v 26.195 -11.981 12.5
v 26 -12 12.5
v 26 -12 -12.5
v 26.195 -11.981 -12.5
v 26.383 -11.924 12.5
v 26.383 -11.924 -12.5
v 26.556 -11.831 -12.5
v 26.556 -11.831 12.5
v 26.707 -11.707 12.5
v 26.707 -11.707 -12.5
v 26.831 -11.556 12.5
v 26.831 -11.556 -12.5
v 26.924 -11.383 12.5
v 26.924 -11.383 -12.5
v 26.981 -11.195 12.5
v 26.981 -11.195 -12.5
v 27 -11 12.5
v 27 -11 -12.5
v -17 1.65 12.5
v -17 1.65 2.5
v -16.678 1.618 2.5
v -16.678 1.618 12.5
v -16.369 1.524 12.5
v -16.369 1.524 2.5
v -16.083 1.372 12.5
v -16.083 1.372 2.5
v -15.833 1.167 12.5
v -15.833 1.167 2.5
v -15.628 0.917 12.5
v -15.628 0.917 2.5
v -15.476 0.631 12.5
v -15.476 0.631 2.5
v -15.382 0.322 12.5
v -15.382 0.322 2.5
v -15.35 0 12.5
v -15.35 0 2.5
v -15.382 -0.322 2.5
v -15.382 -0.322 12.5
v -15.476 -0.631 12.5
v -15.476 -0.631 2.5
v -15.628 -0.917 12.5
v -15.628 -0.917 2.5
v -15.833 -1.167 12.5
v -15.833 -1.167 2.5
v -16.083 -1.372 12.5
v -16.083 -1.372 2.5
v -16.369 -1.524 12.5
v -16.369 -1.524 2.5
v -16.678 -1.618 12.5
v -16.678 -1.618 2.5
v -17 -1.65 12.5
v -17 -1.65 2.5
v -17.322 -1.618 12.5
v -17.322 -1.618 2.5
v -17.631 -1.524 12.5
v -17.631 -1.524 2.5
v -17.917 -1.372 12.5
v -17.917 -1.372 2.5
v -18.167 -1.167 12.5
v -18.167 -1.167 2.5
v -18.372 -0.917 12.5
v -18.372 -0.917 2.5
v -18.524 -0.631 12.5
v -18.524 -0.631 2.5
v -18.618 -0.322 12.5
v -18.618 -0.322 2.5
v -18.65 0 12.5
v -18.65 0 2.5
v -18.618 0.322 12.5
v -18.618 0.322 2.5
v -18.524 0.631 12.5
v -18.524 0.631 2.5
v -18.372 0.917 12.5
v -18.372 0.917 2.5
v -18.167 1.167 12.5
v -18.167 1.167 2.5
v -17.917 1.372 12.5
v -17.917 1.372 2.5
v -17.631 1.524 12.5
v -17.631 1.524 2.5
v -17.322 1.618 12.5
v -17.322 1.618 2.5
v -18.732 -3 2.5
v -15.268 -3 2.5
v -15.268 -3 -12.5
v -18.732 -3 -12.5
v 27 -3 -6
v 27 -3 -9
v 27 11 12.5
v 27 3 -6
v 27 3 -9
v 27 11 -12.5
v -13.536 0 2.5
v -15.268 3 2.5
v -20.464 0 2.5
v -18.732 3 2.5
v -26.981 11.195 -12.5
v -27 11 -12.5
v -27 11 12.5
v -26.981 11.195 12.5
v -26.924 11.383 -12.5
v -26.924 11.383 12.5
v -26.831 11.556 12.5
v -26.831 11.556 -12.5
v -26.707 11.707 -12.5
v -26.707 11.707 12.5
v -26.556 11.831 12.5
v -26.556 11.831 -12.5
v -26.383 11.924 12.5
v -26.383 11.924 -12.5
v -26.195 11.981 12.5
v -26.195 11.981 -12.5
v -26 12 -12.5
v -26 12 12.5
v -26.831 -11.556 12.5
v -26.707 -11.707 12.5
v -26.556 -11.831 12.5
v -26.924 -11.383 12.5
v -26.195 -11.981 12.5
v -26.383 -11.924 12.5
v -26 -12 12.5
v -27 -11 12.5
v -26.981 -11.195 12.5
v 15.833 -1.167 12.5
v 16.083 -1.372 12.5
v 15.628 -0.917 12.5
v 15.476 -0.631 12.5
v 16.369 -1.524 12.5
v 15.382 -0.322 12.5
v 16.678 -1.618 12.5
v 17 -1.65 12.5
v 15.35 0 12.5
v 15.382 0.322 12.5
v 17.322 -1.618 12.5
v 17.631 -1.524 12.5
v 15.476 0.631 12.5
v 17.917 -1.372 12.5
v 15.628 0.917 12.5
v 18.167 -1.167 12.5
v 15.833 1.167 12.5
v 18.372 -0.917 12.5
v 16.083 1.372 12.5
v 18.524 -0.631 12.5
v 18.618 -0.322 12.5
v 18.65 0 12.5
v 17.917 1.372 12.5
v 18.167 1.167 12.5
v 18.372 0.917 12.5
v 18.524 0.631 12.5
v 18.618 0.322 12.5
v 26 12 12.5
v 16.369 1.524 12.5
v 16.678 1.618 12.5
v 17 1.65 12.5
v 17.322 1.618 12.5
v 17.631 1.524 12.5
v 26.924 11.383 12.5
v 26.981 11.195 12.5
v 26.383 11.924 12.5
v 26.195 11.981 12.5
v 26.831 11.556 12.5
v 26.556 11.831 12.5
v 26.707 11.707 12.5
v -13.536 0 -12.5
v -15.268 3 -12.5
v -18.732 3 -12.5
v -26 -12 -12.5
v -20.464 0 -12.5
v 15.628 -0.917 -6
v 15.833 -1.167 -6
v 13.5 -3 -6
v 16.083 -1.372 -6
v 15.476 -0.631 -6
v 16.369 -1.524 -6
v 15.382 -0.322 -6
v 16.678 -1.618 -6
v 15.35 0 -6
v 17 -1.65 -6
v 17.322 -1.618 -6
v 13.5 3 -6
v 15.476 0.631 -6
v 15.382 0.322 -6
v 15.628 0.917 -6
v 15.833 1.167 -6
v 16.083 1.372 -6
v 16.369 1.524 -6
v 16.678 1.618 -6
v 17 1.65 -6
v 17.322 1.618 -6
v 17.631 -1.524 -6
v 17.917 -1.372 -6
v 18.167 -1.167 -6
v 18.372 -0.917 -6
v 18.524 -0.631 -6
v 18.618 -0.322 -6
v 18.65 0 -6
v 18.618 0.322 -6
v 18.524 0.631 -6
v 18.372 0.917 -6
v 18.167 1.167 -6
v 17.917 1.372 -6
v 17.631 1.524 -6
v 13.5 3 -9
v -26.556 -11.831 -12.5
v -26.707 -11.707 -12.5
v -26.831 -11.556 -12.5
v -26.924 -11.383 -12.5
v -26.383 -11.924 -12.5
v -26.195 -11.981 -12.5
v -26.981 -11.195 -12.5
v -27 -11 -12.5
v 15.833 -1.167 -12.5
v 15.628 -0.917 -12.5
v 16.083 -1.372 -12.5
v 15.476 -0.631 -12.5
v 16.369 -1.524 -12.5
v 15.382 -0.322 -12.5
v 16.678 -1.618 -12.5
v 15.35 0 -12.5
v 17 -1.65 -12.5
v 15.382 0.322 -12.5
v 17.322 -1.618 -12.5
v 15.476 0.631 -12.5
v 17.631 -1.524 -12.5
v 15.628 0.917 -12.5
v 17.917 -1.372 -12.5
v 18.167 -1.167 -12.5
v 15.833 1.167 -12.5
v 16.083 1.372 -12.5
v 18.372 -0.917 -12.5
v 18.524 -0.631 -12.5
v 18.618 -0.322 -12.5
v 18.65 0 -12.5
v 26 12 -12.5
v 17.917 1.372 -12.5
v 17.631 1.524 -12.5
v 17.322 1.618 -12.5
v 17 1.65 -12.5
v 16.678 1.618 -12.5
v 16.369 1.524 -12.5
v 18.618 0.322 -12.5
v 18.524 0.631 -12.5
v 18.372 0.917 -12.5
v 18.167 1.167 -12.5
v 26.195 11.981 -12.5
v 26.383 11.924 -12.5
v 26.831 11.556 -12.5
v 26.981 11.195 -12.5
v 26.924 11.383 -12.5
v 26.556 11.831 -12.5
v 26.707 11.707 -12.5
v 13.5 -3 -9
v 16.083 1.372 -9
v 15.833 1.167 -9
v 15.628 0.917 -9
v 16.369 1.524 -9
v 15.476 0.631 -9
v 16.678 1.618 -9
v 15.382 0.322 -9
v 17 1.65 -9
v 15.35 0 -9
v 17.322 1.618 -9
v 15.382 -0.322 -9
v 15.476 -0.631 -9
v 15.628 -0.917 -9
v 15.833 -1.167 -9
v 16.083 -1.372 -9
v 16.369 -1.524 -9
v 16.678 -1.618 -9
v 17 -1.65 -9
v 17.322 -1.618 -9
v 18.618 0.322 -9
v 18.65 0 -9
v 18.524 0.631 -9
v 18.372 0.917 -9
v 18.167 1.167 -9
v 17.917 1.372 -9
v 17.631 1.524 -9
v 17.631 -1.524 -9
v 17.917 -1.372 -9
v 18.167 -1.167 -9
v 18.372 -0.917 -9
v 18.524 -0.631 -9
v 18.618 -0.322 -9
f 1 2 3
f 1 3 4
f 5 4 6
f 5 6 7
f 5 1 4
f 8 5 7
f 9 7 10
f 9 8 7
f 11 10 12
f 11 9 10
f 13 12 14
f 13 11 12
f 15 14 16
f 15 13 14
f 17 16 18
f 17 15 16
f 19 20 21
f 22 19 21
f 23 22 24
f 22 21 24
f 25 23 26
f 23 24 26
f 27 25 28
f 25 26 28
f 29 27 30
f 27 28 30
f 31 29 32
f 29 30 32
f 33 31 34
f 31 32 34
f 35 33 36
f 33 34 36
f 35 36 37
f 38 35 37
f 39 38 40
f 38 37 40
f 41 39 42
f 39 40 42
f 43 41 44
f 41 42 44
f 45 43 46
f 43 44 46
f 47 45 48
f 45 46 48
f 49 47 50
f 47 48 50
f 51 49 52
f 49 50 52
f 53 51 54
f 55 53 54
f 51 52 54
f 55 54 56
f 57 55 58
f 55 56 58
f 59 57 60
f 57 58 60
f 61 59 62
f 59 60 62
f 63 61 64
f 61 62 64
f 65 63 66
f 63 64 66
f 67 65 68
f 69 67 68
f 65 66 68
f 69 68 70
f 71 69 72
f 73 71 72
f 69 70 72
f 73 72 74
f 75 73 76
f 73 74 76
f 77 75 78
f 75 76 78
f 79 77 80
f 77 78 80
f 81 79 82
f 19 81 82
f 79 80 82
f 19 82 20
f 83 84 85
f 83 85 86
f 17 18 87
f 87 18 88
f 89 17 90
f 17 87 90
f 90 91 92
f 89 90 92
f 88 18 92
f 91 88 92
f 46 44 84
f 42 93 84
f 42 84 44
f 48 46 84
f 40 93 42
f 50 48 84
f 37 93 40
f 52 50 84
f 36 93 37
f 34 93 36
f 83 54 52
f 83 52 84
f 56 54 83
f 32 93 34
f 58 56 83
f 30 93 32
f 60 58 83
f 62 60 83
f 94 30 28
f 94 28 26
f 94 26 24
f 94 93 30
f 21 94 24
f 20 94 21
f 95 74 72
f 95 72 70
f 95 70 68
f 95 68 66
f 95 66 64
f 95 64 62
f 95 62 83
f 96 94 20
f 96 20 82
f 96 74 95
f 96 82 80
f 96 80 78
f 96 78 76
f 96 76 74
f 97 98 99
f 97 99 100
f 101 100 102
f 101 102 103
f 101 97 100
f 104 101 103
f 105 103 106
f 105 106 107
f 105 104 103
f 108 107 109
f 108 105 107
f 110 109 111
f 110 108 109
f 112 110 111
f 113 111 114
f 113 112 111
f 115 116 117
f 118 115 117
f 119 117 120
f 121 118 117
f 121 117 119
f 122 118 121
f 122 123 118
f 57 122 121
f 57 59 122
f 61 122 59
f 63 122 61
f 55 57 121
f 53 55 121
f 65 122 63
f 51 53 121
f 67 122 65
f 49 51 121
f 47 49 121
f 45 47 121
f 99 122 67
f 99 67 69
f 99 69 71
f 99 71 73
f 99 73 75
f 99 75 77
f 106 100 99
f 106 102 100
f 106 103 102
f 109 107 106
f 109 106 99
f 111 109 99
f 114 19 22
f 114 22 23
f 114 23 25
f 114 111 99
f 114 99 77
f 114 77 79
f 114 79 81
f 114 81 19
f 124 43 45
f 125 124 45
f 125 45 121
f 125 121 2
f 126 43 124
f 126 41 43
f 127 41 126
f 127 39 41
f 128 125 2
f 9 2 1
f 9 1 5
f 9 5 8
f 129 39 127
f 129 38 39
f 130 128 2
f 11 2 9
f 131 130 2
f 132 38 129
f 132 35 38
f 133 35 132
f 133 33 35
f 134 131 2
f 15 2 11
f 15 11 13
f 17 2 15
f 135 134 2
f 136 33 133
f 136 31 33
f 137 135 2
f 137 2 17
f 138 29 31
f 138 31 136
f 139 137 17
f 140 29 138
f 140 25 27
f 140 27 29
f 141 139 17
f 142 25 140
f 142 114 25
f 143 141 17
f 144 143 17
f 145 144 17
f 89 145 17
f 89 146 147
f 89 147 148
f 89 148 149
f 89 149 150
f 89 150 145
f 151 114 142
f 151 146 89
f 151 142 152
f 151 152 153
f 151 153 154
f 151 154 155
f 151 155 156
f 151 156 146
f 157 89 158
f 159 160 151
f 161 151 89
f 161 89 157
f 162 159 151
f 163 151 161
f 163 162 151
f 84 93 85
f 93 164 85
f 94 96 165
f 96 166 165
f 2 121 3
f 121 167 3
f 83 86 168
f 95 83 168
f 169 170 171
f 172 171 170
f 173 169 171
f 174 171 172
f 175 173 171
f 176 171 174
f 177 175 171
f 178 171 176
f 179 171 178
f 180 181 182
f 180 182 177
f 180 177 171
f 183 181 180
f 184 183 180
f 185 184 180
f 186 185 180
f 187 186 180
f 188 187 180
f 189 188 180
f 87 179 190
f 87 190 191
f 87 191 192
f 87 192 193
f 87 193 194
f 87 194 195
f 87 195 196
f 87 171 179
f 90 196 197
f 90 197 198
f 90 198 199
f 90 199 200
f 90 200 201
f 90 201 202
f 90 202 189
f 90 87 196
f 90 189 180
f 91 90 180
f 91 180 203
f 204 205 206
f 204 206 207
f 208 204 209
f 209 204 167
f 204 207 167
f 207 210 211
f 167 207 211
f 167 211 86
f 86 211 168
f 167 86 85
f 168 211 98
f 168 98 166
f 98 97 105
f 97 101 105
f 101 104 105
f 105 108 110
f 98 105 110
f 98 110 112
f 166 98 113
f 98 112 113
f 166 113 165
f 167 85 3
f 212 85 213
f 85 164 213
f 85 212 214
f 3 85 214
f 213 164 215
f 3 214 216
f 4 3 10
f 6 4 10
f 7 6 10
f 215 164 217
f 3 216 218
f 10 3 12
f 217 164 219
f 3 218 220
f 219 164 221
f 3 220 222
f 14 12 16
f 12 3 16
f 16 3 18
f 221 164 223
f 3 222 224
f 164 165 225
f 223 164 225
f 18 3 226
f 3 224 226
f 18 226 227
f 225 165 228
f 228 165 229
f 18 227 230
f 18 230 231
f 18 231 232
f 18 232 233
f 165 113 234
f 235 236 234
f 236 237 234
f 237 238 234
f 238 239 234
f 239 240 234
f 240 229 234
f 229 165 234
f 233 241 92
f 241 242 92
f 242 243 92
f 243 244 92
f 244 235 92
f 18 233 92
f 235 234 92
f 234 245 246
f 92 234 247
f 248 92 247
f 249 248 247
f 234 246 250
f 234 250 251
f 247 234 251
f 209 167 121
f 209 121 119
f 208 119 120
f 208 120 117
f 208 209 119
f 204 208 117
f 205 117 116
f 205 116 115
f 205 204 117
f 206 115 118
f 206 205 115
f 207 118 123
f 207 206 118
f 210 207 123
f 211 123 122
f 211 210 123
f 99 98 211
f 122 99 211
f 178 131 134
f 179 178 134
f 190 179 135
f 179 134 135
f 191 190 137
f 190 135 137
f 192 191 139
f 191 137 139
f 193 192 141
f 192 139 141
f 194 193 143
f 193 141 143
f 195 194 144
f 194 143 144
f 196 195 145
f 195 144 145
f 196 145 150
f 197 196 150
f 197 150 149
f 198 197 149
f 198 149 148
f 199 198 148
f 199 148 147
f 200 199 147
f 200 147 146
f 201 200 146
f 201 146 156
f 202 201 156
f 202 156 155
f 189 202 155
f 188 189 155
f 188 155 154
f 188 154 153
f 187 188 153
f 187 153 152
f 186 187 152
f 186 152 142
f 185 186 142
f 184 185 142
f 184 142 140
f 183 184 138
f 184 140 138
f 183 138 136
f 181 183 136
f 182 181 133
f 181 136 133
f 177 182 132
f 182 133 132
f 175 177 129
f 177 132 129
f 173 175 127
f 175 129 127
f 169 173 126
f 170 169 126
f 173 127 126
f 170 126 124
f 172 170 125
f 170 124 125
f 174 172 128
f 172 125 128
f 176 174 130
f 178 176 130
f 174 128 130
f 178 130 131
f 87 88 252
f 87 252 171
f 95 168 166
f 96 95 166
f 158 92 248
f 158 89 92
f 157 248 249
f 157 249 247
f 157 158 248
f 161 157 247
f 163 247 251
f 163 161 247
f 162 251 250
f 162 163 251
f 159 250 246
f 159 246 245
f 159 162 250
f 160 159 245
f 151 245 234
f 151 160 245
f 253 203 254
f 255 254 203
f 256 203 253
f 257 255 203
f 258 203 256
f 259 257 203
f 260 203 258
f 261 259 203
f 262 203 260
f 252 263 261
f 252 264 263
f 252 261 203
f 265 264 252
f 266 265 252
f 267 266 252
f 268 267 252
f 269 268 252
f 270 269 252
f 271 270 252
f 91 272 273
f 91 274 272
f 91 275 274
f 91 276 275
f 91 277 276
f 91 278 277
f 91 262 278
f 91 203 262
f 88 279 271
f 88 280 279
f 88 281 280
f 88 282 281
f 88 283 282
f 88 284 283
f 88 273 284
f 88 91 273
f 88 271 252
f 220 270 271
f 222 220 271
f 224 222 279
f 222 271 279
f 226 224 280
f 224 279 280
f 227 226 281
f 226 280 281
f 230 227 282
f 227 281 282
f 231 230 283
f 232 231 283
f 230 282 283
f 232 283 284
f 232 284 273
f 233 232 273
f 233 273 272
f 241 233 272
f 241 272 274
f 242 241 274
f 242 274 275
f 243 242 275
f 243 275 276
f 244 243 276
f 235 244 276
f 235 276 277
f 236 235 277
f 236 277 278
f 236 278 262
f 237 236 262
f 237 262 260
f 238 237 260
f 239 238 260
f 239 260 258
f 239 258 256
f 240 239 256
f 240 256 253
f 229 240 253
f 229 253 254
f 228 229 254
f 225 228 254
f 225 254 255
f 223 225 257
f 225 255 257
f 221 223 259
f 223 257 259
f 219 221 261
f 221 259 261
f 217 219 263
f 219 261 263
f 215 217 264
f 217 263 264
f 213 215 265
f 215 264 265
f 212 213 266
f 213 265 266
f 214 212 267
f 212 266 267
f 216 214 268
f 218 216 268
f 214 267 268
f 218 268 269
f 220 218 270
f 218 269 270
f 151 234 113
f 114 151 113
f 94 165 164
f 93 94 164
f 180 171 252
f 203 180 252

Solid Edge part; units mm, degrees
sketch "Sketch1" plane through (0, 0, 0) normal (0, 0, 1) x (1, 0, 0)
  line L0 (-27, -12) -> (27, -12)
  line L1 (27, -12) -> (27, 12)
  line L2 (27, 12) -> (-27, 12)
  line L3 (-27, 12) -> (-27, -12)
  dimension "D1" = 54
  dimension "D2" = 24
extrude "Ajout_matière_1" add sketch "Sketch1" along normal mid plane 25
fillet "Congé_1" radius 1 4 edges at (27, -12, 0) (27, 12, 0) (-27, -12, 0) (-27, 12, 0)
hole "Hole1" at (17, 0, 12.5) direction (0, 0, -1) diameter 3.3 end up to next
sketch "Sketch2" plane through (27, 0, 0) normal (1, 0, 0) x (0, 0, -1)
  line L0 (6, 3) -> (9, 3)
  line L1 (9, 3) -> (9, -3)
  line L2 (9, -3) -> (6, -3)
  line L3 (6, -3) -> (6, 3)
  dimension "D1" = 6
  dimension "D2" = 3
  dimension "D3" = 5
extrude "Enlèvement_matière_3" cut sketch "Sketch2" against normal blind 13.5
sketch "Sketch3" plane through (0, 0, -12.5) normal (0, 0, -1) x (0, 1, 0)
  line L0 (3, -15.2679) -> (0, -13.5359)
  line L1 (0, -13.5359) -> (-3, -15.2679)
  line L2 (-3, -15.2679) -> (-3, -18.7321)
  line L3 (-3, -18.7321) -> (0, -20.4641)
  line L4 (0, -20.4641) -> (3, -18.7321)
  line L5 (3, -18.7321) -> (3, -15.2679)
  dimension "D1" = 3
  dimension "D2" = 3.4641
  dimension "D3" = 10
extrude "Cutout1" cut sketch "Sketch3" against normal blind 15
hole "Perçage_5" at (-17, 0, 2.5) direction (0, 0, 1) diameter 3.3 end up to next
properties material "Plastique ABS, haute performance"
